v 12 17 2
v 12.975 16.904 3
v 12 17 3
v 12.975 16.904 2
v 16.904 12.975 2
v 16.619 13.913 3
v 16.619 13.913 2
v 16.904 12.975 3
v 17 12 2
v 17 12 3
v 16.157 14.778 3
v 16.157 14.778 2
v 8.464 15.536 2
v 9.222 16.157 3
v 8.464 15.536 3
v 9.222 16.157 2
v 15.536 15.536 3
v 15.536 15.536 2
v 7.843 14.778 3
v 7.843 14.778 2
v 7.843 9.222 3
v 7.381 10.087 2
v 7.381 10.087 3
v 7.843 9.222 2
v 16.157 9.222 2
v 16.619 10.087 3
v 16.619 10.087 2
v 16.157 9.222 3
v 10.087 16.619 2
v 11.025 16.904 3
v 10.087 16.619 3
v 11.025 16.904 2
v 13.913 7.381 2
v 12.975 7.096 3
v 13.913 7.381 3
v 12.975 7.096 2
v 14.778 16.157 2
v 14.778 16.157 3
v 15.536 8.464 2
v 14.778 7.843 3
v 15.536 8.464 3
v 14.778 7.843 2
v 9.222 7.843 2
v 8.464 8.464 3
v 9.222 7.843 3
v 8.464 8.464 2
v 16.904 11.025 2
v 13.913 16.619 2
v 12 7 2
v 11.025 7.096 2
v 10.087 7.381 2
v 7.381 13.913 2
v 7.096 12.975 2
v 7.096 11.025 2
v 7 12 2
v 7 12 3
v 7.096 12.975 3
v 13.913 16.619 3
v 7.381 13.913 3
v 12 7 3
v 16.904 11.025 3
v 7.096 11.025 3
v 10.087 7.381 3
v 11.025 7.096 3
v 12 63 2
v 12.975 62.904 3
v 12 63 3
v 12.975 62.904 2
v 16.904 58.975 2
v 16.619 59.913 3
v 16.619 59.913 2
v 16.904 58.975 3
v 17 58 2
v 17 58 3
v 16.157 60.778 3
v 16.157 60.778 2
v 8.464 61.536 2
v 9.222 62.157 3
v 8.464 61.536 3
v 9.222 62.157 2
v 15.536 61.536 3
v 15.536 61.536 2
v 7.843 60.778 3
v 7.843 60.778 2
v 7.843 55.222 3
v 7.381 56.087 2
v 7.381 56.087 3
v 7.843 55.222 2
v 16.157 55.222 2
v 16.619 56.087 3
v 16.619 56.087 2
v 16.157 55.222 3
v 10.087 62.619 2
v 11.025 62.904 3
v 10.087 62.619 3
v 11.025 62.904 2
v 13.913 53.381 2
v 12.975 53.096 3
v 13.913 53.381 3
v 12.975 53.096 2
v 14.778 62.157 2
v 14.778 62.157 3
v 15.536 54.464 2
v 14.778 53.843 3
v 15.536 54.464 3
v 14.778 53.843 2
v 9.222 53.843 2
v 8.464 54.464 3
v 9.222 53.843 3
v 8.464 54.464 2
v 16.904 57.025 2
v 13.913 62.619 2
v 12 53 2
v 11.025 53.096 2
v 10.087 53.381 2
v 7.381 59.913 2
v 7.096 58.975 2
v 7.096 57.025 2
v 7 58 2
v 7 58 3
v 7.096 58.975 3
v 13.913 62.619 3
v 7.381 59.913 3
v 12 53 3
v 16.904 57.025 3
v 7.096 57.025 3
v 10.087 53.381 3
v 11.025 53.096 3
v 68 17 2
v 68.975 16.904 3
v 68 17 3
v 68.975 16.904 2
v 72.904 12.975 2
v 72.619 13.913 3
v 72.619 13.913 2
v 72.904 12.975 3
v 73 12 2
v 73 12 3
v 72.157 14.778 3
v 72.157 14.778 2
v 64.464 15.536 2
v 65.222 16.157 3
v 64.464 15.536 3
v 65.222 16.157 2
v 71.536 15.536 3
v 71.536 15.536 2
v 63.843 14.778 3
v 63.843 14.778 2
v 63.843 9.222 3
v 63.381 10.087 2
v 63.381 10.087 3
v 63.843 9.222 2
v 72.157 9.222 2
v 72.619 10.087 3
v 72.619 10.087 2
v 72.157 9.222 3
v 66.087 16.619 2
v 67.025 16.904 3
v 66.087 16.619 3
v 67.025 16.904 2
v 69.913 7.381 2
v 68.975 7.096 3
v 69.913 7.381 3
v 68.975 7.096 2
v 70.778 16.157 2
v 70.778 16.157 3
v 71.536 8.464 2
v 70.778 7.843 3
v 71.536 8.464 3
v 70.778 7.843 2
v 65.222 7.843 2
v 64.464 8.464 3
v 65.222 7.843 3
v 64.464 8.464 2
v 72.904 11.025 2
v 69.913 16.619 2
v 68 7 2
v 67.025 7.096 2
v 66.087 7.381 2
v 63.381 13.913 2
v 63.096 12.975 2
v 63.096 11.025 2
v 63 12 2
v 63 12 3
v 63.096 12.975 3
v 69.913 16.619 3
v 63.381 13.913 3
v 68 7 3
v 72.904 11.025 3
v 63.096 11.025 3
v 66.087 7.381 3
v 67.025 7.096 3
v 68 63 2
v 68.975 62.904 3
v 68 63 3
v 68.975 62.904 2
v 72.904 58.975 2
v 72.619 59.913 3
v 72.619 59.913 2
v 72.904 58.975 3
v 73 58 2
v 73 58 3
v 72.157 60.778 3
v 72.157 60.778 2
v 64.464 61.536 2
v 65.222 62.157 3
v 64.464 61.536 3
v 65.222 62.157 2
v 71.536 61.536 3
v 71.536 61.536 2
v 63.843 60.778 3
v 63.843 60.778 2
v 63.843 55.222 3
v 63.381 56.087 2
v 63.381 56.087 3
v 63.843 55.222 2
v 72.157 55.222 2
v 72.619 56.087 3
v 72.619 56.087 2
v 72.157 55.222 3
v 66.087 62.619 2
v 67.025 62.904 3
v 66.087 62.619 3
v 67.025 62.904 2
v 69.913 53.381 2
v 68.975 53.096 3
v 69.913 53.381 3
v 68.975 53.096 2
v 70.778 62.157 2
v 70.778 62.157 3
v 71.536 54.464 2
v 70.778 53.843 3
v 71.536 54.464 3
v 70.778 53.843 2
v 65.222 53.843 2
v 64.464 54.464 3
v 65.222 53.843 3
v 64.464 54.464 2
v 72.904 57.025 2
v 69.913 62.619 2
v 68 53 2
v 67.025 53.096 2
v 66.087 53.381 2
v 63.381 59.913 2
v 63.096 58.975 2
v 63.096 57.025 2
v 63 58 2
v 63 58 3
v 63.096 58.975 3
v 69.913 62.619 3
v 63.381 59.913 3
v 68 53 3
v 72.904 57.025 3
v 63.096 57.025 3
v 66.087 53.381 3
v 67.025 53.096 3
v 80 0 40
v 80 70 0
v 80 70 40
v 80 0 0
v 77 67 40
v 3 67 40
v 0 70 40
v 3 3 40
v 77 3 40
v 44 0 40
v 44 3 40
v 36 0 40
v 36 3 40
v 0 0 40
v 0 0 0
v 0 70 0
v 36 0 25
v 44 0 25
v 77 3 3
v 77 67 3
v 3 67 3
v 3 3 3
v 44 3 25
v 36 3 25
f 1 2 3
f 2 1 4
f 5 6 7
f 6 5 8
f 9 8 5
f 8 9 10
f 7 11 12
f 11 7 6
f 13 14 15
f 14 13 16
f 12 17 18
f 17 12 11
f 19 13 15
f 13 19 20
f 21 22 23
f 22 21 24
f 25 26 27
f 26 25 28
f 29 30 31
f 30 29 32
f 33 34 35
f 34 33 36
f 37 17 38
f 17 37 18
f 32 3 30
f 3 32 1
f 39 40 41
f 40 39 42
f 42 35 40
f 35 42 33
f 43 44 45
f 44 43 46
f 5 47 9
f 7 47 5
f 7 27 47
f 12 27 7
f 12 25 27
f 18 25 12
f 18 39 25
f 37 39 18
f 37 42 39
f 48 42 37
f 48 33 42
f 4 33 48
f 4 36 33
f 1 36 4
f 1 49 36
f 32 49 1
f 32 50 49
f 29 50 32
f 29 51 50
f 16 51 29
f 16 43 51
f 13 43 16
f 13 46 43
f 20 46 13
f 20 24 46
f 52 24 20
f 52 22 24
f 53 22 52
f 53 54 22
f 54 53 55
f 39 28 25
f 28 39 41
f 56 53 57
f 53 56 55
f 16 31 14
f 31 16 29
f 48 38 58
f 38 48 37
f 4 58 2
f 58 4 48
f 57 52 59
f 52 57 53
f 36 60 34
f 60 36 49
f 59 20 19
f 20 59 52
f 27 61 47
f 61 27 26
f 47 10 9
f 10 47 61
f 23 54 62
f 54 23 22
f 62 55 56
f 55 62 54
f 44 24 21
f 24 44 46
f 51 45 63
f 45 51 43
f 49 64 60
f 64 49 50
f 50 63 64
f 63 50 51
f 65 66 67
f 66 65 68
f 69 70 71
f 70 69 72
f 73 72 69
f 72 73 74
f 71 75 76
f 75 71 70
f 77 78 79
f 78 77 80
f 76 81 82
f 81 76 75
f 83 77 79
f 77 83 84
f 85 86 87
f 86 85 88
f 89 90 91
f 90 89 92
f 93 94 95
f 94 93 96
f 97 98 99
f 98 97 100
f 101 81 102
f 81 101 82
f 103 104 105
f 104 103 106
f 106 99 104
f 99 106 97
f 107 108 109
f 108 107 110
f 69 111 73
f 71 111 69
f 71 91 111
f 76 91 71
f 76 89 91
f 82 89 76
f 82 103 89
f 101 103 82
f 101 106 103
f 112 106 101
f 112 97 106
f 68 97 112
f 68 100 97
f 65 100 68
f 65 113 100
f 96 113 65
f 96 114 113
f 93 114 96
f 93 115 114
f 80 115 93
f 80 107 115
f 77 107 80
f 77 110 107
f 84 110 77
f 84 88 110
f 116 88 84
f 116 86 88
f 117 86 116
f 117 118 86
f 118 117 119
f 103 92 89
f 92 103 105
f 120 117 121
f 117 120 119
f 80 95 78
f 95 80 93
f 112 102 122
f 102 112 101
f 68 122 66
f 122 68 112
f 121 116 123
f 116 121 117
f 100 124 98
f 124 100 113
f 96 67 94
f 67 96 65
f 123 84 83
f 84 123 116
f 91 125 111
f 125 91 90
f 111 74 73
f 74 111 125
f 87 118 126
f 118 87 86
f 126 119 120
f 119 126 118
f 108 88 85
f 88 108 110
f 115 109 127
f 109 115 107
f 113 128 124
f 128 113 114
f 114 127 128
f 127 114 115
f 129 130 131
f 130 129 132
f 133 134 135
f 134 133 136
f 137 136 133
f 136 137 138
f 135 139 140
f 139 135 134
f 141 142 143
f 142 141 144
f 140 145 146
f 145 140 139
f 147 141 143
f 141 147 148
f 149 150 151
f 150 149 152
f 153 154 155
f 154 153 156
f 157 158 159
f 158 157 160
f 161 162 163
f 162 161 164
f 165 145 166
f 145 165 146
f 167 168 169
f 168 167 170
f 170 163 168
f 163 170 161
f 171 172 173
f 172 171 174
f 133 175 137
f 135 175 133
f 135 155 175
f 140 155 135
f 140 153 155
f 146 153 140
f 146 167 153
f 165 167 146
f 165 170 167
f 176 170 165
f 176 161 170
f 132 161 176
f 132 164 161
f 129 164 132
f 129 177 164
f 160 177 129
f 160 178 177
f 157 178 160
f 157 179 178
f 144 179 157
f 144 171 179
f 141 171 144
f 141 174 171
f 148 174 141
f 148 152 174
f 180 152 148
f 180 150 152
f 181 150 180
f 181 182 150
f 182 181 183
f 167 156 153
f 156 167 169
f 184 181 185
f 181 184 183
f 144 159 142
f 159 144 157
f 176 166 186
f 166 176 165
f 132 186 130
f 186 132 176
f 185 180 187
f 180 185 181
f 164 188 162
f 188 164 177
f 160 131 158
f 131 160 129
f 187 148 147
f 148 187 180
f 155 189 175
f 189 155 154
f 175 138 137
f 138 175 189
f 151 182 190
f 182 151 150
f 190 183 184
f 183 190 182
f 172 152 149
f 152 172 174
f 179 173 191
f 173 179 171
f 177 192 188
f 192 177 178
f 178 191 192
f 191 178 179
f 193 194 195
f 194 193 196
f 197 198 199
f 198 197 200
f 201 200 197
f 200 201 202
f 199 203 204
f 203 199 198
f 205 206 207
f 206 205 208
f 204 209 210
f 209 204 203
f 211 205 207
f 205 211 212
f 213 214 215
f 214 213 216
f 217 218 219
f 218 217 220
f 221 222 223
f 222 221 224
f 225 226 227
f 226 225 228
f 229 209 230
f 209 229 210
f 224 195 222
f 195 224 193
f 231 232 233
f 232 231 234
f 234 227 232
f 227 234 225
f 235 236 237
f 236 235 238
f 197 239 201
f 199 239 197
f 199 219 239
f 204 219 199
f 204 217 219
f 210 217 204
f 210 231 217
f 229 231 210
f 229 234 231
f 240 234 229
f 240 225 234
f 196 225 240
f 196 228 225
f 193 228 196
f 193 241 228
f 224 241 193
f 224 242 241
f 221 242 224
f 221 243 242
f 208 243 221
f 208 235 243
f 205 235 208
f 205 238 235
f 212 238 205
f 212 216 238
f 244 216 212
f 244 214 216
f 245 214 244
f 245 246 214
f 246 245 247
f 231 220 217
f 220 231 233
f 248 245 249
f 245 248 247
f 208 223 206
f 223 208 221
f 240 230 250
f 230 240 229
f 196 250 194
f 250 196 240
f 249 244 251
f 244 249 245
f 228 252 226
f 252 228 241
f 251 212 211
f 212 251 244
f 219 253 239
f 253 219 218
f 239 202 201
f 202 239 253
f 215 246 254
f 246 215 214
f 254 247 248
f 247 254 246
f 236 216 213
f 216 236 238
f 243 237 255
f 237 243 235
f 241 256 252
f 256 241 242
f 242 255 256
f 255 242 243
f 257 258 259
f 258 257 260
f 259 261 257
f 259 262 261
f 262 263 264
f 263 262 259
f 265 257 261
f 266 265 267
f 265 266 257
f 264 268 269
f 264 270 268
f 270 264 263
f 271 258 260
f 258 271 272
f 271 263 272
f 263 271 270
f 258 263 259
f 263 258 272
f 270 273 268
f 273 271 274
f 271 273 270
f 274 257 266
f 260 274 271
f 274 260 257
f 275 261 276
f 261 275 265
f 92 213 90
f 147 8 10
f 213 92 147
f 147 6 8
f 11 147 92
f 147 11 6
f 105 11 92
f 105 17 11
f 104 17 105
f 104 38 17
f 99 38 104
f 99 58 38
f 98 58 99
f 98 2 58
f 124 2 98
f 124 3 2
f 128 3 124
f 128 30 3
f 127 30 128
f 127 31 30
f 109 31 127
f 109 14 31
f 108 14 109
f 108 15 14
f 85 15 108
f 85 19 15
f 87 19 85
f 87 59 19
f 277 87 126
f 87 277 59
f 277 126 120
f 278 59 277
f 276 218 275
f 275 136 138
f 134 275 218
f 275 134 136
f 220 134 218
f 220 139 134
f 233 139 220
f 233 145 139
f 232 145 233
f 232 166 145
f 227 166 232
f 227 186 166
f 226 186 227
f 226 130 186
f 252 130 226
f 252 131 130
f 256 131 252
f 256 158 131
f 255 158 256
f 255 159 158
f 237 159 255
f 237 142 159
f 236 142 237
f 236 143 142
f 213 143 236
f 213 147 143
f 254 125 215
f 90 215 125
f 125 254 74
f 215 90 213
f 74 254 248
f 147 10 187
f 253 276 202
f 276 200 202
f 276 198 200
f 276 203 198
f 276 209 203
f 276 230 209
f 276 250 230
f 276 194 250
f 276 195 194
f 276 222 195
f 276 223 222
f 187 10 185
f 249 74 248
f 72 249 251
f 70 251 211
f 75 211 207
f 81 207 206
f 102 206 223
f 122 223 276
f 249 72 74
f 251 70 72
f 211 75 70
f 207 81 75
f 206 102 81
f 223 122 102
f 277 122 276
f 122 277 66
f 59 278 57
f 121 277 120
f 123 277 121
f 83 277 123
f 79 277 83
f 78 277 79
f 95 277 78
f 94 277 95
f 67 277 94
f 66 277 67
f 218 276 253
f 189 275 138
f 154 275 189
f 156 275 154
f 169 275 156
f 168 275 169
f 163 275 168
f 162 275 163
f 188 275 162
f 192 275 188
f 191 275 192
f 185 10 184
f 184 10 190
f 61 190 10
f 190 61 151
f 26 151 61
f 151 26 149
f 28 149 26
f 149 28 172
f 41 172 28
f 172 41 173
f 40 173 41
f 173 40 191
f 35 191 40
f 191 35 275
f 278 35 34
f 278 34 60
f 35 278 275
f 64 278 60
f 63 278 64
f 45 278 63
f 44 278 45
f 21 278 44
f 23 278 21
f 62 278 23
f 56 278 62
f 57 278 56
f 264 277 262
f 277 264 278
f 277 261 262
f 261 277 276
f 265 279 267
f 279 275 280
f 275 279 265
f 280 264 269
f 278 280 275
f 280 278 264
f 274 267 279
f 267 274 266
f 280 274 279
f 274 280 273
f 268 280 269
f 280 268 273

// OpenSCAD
$fn = 32;

// ----------------------------------------------------------------------
// Enclosure box: both enclosure
// ----------------------------------------------------------------------

// --- parameters (mm) ---
box_l = 80;               // outer length, X
box_w = 70;               // outer width, Y
box_h = 40;               // outer height
wall_t = 3;               // wall thickness
boss_r = 5;               // corner boss radius
hole_r = 2;               // boss screw hole radius
boss_in = 12;             // boss inset from the corners
notch_w = 8;              // cable notch width
notch_h = 15;             // cable notch height

inner_h = box_h - wall_t;  // cavity depth
boss_h = inner_h - 2;  // corner boss height

difference() {
  cube([box_l, box_w, box_h]);
  translate([wall_t, wall_t, wall_t])
    cube([box_l - 2 * wall_t, box_w - 2 * wall_t, box_h]);
  for (sx = [0, 1], sy = [0, 1])
    translate([sx ? box_l - boss_in : boss_in,
               sy ? box_w - boss_in : boss_in, wall_t - 1]) {
      cylinder(r = boss_r, h = boss_h);
      translate([0, 0, boss_h - 4])
        cylinder(r = hole_r, h = 5);
    }
  translate([box_l / 2 - notch_w / 2, -1, box_h - notch_h])
    cube([notch_w, wall_t + 2, notch_h + 1]);
}
